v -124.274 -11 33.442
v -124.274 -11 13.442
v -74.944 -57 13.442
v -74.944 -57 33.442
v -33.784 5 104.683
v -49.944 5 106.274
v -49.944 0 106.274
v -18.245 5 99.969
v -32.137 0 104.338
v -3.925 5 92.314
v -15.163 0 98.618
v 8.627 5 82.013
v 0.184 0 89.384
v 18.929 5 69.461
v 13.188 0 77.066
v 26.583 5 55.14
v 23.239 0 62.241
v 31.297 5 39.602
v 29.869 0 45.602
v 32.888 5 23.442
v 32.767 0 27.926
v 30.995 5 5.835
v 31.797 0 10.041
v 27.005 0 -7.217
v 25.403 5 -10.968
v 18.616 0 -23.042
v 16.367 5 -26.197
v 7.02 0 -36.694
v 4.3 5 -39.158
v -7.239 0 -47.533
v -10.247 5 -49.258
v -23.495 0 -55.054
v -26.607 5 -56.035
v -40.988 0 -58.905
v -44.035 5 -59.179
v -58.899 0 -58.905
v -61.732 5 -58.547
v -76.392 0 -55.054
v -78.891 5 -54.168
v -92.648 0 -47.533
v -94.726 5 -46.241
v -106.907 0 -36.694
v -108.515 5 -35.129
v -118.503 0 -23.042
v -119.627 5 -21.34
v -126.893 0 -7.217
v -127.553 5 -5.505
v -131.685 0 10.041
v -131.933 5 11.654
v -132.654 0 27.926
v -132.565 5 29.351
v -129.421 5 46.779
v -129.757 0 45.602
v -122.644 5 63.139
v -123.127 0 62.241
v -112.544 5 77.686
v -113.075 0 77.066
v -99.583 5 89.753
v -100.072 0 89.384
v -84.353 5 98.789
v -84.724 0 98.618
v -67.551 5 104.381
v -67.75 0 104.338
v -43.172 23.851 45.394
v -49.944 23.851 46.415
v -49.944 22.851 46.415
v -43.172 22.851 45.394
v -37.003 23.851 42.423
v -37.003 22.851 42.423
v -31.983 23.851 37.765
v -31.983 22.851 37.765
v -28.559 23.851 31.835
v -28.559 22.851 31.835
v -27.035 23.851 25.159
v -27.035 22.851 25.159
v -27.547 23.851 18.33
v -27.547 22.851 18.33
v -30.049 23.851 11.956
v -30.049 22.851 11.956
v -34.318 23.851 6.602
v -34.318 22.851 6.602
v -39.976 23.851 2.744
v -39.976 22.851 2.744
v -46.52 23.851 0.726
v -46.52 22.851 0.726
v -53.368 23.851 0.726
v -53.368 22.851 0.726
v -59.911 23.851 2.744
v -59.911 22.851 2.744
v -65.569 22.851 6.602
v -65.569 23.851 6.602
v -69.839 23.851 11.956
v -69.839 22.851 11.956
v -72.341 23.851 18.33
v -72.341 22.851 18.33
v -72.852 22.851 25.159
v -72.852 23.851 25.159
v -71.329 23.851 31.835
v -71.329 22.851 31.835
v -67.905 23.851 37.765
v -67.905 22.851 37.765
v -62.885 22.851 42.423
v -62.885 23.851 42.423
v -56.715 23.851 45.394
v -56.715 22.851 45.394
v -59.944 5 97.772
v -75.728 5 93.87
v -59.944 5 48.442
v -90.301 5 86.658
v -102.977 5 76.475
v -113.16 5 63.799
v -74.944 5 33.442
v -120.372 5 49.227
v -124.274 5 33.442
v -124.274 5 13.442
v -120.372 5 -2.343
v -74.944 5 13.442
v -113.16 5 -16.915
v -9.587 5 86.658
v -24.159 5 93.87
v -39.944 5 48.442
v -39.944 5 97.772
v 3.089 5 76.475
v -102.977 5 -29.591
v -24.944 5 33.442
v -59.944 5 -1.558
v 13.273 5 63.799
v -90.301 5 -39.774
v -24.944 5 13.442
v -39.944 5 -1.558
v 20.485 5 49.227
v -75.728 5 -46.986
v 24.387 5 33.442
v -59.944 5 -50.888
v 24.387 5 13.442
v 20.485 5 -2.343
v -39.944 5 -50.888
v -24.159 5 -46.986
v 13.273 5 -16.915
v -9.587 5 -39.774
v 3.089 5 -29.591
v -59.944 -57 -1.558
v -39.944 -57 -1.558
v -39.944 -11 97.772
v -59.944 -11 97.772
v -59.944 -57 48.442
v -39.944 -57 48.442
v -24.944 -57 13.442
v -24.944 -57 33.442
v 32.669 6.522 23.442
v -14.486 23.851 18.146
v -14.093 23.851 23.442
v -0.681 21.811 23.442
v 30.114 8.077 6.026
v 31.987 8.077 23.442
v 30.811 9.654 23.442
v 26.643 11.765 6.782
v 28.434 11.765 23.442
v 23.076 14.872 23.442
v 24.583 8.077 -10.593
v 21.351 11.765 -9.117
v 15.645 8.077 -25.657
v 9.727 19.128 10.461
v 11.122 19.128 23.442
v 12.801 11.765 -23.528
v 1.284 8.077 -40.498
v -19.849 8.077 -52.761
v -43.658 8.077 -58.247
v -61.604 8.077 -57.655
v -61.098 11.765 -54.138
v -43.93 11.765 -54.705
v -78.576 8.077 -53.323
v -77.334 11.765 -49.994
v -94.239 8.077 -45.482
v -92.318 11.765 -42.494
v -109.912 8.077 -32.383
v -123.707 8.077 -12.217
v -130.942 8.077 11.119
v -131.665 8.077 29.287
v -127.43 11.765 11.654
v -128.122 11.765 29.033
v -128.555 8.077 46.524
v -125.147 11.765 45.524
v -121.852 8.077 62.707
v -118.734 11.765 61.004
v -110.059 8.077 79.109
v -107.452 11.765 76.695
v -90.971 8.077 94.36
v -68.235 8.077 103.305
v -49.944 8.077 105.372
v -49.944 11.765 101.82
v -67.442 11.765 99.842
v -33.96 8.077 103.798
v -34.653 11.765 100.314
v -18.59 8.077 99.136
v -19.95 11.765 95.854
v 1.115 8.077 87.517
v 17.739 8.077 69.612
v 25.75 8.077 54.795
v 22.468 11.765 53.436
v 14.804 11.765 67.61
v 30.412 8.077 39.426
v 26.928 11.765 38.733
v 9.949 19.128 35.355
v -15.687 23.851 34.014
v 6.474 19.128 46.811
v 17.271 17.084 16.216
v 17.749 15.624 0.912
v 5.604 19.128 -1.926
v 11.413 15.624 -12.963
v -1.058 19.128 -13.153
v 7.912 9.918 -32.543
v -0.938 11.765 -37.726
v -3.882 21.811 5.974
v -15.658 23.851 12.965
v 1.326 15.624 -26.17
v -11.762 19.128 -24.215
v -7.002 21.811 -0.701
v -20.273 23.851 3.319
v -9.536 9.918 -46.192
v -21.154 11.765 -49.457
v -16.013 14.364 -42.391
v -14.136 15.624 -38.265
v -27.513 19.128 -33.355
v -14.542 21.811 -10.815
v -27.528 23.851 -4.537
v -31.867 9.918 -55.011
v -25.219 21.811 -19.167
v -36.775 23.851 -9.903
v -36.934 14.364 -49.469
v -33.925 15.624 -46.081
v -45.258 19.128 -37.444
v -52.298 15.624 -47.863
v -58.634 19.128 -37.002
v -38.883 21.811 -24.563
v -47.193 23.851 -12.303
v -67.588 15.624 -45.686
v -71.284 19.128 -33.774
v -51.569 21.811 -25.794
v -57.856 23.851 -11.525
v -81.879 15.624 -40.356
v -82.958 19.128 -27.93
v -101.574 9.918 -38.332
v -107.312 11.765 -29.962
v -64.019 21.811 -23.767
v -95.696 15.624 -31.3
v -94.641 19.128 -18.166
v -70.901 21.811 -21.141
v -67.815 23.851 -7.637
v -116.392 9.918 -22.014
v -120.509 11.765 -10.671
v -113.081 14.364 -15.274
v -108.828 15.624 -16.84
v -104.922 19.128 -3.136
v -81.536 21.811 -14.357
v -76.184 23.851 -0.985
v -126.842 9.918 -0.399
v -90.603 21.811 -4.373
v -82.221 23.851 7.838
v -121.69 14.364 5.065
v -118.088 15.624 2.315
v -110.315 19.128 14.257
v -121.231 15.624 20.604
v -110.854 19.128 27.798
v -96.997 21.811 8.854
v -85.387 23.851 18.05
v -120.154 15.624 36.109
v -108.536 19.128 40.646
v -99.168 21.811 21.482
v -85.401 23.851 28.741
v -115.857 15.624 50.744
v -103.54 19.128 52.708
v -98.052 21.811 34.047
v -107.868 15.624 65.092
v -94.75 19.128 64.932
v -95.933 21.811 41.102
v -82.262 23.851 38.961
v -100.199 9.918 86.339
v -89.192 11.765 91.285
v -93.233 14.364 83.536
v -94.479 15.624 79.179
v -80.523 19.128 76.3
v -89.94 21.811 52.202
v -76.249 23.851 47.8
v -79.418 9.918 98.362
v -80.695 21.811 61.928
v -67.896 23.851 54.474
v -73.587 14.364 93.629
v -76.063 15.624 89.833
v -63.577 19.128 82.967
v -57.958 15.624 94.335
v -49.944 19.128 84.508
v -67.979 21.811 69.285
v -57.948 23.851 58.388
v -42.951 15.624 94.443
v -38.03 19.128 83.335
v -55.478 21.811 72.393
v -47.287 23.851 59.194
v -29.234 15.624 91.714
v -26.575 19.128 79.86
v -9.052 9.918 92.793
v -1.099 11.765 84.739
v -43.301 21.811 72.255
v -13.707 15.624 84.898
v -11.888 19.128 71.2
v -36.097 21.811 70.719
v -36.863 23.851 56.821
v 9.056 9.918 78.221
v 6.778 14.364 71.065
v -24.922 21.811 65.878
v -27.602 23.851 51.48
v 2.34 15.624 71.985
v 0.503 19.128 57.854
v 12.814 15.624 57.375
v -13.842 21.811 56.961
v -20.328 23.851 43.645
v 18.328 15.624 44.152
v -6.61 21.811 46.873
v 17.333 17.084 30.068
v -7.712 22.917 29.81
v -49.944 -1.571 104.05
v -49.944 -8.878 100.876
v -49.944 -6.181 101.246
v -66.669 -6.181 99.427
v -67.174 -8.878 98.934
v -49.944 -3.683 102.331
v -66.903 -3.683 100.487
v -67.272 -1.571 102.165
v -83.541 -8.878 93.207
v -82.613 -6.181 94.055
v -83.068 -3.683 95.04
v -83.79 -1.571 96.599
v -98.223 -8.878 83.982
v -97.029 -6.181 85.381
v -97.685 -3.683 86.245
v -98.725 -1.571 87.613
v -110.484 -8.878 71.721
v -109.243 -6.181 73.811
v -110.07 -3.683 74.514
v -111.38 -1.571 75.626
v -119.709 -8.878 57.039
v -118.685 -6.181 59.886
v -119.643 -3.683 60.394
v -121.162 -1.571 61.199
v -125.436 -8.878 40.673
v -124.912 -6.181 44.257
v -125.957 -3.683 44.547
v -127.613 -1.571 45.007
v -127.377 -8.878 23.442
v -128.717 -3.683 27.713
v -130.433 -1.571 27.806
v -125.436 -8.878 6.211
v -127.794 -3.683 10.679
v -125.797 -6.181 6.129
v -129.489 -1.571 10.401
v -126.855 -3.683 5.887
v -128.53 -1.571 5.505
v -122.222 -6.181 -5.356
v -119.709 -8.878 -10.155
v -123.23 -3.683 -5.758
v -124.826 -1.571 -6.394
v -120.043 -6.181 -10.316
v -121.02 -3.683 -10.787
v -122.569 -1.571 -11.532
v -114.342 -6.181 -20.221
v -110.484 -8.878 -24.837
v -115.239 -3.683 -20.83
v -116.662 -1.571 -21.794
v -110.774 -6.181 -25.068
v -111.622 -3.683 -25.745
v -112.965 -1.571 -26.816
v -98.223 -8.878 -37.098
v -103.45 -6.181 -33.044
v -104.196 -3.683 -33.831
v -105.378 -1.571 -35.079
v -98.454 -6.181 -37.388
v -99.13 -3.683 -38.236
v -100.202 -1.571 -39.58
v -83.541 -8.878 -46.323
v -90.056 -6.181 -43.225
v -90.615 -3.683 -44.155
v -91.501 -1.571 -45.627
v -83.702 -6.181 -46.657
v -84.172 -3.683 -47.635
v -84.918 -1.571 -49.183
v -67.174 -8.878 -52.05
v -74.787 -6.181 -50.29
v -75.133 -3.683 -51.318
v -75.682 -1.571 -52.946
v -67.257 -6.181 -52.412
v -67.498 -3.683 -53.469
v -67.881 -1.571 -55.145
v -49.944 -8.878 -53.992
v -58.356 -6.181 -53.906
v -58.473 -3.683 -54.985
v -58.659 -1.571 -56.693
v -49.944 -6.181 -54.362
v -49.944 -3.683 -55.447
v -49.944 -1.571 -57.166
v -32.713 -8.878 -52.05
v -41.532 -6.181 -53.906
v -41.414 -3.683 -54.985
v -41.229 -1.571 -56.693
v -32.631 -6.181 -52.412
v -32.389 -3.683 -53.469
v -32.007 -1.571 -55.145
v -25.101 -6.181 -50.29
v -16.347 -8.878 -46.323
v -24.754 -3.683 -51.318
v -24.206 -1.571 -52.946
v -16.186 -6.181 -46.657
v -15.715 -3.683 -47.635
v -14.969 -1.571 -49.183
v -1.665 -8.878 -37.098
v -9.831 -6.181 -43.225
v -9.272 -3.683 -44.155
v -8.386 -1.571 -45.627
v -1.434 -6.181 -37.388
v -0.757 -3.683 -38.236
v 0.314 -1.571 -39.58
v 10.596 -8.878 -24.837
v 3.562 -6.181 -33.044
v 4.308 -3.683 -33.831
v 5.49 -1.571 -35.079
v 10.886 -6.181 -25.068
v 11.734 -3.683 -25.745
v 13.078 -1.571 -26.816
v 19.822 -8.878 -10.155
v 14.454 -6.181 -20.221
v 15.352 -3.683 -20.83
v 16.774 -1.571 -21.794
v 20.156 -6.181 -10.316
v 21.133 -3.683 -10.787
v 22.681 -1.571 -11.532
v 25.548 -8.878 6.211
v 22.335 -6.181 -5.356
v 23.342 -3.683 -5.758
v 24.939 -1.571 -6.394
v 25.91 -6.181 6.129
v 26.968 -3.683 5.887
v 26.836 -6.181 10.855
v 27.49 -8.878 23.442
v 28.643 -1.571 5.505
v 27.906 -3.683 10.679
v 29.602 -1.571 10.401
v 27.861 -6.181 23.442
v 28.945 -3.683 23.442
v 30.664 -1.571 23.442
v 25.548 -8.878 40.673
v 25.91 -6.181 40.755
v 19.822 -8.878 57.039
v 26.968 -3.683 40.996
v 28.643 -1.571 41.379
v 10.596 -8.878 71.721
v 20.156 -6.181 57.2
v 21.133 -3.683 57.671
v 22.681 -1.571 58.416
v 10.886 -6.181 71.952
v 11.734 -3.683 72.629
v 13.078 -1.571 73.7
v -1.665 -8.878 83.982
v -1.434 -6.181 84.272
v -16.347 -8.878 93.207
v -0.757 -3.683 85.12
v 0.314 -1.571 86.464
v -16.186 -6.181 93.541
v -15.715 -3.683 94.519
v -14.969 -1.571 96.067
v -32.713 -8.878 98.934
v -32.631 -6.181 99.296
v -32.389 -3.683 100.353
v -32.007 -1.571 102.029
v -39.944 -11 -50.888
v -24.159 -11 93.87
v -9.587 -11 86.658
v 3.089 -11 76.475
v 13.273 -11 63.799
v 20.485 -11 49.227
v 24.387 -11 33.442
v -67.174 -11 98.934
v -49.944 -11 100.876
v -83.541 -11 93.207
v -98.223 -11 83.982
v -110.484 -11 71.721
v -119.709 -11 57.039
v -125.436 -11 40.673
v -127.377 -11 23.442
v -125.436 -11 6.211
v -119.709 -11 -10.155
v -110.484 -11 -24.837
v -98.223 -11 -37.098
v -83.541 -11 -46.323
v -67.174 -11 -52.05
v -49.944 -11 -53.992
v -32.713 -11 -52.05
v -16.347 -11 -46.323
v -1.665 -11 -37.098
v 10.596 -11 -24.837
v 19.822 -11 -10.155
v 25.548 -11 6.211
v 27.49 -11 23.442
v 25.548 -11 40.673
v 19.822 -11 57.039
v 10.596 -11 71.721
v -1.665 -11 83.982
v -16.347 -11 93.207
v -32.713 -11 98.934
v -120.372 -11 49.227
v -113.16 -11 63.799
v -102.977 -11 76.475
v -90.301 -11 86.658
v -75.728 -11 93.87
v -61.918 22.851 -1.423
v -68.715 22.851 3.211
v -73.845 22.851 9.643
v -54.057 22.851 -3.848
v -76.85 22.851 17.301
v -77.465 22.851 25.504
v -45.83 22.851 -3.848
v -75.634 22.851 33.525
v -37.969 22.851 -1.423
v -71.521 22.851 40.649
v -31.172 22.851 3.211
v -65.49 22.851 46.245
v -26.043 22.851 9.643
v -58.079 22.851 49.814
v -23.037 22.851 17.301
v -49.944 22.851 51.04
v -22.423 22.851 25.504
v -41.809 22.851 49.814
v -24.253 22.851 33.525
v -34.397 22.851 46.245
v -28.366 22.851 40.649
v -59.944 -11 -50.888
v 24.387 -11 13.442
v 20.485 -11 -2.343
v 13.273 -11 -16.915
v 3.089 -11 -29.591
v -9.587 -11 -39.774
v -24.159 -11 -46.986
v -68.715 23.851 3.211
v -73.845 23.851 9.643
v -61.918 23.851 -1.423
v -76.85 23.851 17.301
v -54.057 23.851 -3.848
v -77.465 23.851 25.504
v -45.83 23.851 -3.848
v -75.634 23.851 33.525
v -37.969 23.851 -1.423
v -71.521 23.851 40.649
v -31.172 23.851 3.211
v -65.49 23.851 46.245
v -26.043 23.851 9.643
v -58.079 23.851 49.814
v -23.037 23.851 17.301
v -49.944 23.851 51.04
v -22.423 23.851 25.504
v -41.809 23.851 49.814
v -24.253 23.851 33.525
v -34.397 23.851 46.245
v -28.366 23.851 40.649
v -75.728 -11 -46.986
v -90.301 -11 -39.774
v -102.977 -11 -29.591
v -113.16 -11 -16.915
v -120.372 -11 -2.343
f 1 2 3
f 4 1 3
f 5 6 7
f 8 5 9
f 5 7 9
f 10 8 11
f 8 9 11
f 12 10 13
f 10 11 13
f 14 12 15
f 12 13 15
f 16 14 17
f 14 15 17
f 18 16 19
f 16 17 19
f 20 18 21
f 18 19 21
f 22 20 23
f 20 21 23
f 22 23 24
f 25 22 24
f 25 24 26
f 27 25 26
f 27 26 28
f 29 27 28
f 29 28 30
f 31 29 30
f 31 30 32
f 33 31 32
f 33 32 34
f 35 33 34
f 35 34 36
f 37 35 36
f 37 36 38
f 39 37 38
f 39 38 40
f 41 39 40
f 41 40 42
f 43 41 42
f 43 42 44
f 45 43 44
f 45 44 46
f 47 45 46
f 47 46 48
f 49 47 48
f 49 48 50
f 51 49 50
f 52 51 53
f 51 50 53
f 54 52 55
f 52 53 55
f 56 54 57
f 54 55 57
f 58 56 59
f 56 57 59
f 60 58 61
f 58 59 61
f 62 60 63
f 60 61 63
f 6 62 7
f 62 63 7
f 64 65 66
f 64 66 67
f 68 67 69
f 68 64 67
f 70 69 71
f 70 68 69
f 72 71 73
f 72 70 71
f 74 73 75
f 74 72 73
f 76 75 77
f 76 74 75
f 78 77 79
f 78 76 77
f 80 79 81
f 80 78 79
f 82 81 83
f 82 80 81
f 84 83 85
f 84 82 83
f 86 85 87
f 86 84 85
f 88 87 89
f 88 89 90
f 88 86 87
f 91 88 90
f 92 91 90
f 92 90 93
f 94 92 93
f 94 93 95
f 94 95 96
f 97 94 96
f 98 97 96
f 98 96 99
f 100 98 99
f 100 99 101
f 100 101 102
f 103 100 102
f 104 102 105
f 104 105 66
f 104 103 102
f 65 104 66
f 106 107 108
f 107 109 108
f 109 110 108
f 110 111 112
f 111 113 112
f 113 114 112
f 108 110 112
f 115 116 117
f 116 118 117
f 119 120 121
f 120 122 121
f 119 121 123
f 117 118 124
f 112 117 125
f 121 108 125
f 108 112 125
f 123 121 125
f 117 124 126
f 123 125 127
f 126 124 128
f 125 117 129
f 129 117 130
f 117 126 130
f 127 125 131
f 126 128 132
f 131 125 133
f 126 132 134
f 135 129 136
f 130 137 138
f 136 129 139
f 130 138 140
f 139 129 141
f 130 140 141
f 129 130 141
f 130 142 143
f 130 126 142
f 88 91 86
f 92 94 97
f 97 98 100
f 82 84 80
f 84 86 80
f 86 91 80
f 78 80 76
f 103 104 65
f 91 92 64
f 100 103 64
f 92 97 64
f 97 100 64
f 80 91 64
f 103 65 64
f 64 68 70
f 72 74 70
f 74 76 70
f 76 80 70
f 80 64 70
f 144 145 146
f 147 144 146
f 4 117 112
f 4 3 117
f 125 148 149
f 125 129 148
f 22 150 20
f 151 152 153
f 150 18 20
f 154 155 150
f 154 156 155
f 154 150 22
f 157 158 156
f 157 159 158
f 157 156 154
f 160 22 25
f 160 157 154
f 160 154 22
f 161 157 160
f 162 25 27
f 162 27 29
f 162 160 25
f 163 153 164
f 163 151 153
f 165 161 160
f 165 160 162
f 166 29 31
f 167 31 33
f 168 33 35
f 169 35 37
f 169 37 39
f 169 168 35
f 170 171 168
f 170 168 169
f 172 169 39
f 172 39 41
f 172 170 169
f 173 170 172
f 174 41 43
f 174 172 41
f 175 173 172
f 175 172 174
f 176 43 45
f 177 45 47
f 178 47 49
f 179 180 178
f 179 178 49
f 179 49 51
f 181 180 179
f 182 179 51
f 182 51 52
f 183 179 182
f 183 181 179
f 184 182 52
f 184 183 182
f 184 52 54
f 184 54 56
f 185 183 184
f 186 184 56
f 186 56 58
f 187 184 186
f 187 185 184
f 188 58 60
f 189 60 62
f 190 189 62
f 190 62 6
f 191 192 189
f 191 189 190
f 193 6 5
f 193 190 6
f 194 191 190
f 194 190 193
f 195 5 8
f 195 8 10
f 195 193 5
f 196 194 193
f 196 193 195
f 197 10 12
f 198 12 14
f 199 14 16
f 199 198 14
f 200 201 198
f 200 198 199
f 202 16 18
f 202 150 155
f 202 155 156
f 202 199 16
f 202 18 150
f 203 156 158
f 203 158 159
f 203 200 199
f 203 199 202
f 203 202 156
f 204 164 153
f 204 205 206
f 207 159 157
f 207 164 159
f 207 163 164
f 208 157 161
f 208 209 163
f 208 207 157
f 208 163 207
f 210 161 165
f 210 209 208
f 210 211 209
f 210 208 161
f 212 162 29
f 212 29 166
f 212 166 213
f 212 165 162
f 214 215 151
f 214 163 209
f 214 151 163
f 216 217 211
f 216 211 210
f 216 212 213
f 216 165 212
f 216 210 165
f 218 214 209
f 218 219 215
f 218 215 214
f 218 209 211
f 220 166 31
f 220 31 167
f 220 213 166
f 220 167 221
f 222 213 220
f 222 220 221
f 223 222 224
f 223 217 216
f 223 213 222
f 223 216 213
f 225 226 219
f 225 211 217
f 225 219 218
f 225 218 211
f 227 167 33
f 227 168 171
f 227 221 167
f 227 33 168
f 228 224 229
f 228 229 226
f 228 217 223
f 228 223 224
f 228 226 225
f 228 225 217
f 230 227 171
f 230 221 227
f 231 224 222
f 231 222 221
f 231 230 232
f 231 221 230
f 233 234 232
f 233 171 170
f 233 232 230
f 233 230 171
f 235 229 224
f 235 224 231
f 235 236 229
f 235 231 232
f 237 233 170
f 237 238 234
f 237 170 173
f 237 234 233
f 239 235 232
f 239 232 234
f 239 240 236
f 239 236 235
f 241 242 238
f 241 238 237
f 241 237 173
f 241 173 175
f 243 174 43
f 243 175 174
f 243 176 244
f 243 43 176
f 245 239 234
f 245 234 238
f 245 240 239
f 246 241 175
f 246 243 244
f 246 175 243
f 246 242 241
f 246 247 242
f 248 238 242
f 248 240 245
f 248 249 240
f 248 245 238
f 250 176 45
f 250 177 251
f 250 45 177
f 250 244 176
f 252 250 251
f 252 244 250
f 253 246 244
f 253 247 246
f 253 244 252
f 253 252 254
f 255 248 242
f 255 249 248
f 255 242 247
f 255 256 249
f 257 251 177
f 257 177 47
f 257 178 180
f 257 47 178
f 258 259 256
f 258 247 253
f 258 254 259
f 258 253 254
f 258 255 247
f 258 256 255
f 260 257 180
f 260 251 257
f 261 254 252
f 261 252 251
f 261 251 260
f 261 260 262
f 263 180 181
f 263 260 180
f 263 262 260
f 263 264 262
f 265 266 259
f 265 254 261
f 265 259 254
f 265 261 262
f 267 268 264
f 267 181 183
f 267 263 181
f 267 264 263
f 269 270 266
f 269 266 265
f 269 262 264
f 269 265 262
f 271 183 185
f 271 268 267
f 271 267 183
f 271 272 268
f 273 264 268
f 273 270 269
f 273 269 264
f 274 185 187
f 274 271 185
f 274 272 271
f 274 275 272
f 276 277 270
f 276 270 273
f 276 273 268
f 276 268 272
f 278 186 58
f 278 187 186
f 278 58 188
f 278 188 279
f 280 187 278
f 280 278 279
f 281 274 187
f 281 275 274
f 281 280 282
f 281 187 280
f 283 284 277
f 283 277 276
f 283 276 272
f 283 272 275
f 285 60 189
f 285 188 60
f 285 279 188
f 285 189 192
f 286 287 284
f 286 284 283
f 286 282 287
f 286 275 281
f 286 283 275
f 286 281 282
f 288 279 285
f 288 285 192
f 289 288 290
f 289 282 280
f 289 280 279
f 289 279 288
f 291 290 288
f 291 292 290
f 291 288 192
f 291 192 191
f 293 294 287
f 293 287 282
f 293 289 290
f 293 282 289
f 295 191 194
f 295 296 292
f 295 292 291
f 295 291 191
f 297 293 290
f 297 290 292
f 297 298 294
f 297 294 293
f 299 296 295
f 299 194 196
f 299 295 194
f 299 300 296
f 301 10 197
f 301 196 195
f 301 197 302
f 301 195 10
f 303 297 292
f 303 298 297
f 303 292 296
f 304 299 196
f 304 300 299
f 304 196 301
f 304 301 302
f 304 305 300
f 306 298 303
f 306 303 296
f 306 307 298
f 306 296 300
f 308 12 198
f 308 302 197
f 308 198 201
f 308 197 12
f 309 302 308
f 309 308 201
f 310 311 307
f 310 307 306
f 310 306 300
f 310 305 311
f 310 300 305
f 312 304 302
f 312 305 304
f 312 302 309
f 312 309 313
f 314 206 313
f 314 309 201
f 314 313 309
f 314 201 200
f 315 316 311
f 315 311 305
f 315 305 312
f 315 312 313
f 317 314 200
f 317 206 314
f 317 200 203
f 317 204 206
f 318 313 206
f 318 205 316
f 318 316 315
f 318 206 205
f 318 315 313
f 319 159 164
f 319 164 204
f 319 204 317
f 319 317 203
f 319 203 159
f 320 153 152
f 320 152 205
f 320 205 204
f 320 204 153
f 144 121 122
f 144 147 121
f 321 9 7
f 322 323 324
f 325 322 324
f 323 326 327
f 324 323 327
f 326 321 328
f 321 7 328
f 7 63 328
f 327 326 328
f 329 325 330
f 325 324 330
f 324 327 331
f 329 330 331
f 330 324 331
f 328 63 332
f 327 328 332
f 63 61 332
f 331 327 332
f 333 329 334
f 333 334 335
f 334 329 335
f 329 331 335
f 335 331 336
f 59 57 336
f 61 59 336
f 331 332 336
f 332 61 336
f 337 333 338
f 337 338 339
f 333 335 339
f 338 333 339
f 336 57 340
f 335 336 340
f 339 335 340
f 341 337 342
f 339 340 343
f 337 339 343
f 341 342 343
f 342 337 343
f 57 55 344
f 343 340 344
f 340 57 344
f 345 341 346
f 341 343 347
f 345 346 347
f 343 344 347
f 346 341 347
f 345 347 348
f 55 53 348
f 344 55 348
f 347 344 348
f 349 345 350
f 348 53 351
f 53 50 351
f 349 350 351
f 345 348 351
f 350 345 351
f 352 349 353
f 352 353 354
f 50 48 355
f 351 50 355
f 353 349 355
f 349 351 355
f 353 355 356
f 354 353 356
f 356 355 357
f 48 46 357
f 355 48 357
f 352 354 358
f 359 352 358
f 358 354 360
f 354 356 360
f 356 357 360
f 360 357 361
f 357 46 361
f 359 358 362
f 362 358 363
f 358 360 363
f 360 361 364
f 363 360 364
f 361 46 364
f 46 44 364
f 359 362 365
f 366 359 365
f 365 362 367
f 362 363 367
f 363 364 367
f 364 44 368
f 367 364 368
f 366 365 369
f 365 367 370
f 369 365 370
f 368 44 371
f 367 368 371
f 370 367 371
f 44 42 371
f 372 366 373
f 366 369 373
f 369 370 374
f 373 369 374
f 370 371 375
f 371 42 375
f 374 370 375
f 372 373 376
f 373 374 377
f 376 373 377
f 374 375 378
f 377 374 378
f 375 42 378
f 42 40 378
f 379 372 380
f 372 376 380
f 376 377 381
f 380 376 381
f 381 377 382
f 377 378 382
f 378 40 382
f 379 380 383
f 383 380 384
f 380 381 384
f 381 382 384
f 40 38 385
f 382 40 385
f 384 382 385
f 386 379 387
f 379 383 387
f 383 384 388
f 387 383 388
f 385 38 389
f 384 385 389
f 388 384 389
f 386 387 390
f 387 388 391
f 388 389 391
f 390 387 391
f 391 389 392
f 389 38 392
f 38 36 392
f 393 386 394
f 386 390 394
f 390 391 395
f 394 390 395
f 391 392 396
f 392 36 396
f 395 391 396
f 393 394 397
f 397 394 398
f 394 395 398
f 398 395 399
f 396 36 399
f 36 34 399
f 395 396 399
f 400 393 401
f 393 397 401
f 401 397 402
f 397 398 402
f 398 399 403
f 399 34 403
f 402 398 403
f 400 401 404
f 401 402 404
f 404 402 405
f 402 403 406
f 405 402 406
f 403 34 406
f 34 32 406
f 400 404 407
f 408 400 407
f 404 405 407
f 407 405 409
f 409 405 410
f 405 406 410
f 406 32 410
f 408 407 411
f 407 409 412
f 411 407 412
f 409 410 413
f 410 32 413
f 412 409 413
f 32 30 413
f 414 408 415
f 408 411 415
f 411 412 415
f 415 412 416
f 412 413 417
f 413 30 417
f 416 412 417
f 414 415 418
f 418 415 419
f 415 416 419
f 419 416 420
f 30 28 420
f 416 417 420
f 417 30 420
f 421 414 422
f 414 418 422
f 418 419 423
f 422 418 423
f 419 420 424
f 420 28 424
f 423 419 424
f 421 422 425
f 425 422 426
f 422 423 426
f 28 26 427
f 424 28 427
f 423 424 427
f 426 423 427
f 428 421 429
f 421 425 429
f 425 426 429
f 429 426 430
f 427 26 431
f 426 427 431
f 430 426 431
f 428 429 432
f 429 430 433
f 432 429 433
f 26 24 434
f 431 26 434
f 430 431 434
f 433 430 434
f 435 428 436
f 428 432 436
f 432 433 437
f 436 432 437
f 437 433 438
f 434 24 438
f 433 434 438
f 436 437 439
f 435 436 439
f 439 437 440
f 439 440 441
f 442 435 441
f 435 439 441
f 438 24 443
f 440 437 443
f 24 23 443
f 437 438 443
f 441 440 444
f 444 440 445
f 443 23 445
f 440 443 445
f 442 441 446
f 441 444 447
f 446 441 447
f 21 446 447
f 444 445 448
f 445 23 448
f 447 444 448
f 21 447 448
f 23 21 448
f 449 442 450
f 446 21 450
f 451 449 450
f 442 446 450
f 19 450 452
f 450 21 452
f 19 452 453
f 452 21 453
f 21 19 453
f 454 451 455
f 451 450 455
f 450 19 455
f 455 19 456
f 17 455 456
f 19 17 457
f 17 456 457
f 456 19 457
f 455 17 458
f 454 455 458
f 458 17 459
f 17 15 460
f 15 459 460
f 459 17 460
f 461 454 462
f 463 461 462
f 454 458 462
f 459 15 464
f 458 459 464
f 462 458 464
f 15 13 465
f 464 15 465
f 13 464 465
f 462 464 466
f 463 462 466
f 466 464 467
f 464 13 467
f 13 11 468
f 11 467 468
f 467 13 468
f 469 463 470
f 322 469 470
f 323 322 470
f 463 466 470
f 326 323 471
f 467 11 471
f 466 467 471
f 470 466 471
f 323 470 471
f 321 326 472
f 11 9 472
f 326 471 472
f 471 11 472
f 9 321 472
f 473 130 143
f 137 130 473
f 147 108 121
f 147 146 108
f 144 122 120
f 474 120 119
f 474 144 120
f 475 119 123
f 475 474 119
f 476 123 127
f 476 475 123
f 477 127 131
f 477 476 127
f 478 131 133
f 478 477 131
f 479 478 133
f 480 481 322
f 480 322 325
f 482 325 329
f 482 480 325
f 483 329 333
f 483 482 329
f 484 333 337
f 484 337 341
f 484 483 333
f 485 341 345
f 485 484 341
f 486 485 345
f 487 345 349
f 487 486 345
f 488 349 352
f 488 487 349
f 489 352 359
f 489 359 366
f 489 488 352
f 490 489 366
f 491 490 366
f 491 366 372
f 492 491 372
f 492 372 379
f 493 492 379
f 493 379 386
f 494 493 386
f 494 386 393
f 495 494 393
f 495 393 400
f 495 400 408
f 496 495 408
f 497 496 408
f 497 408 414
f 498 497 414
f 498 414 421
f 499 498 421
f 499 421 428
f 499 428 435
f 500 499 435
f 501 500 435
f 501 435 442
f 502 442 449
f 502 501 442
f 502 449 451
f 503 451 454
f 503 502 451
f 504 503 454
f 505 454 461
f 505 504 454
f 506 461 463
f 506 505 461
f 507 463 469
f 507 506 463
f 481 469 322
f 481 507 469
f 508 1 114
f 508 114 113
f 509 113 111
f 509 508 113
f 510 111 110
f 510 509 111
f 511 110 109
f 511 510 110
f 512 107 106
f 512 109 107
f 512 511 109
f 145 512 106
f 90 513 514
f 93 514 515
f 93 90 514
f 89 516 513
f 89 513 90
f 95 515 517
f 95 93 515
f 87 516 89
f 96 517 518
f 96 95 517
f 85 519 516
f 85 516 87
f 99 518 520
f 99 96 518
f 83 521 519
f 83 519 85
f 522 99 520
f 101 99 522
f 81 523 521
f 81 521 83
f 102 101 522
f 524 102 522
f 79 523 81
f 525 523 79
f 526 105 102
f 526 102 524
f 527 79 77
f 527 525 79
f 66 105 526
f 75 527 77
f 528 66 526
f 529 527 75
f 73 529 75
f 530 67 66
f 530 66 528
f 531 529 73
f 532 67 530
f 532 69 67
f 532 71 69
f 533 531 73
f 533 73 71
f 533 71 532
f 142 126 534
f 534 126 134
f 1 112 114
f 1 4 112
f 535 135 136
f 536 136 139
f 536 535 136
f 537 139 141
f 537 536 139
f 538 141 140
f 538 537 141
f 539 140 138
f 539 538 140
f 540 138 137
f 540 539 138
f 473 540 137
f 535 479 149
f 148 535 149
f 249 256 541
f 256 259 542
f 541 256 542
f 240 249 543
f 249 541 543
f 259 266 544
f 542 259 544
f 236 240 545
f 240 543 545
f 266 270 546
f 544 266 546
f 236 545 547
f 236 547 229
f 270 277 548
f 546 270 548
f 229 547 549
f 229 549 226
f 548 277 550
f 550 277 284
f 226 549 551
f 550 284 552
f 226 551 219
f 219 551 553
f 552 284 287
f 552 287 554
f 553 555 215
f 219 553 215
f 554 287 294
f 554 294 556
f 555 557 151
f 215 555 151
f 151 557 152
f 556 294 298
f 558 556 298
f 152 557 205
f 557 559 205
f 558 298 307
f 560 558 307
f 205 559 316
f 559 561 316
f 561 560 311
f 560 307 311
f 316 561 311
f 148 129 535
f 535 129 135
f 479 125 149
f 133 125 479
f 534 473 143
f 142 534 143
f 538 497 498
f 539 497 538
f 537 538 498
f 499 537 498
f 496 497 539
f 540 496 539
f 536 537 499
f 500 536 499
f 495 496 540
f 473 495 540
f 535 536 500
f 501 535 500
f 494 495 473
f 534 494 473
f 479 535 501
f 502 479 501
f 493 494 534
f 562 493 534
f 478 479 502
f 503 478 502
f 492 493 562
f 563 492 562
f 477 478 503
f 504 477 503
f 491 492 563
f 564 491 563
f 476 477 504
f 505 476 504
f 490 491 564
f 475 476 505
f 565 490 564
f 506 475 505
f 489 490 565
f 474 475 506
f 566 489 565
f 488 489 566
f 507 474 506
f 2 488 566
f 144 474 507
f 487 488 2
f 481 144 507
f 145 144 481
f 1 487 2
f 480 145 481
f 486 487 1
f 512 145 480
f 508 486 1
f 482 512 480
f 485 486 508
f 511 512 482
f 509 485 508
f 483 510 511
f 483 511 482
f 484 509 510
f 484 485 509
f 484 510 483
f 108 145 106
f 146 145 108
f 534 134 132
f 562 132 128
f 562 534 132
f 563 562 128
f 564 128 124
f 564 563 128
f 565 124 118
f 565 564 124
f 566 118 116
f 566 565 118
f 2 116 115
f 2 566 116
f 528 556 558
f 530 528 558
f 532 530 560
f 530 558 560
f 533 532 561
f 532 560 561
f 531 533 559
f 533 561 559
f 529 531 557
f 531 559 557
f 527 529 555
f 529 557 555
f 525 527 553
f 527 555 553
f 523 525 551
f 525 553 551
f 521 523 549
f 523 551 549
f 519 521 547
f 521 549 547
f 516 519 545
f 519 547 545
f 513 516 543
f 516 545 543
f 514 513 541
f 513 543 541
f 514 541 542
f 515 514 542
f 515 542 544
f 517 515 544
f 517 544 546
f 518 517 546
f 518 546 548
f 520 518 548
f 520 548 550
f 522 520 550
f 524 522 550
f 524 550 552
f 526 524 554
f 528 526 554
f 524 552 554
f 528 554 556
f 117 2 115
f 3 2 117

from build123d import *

# Parameters (mm, degrees)
SKETCH1_R           = 82.832169861
BOSS_EXTRUDE1_DEPTH = 5
SKETCH3_W           = 93.167206873
SKETCH3_H           = 4.120105984
CUT_EXTRUDE1_DEPTH  = 75
SKETCH4_R           = 27.598349682
SKETCH4_R_2         = 22.972927947
CUT_EXTRUDE2_DEPTH  = 1
BOSS_EXTRUDE2_START = 11
SKETCH5_R           = 77.433591729
BOSS_EXTRUDE2_DEPTH = 11
FILLET1_R           = 10
SKETCH6_W           = 49.330343736
SKETCH6_H           = 20
BOSS_EXTRUDE3_DEPTH = 46
CUT_EXTRUDE3_DEPTH  = 46
CIRPATTERN1_COUNT   = 4


with BuildPart() as part:
    # Sketch1 → Boss-Extrude1 (new body)
    with BuildSketch(Plane(origin=(0, 0, 0), x_dir=(1, 0, 0), z_dir=(0, 1, 0))):
        with Locations(Location((-49.943747887, -23.441982102, 0), (0, 0, 270))):
            Circle(SKETCH1_R)
        with BuildLine():
            Line((-59.943747887, 50.888361635), (-59.943747887, 1.558017898))
            Line((-59.943747887, 1.558017898), (-39.943747887, 1.558017898))
            Line((-39.943747887, 1.558017898), (-39.943747887, 50.888361635))
            ThreePointArc((-39.943747887, 50.888361635), (3.089260702, 29.591026487), (24.386595849, -13.441982102))
            Line((24.386595849, -13.441982102), (-24.943747887, -13.441982102))
            Line((-24.943747887, -13.441982102), (-24.943747887, -33.441982102))
            Line((-24.943747887, -33.441982102), (24.386595849, -33.441982102))
            ThreePointArc((24.386595849, -33.441982102), (3.089260702, -76.474990691), (-39.943747887, -97.772325838))
            Line((-39.943747887, -97.772325838), (-39.943747887, -48.441982102))
            Line((-39.943747887, -48.441982102), (-59.943747887, -48.441982102))
            Line((-59.943747887, -48.441982102), (-59.943747887, -97.772325838))
            ThreePointArc((-59.943747887, -97.772325838), (-102.976756476, -76.474990691), (-124.274091624, -33.441982102))
            Line((-124.274091624, -33.441982102), (-74.943747887, -33.441982102))
            Line((-74.943747887, -33.441982102), (-74.943747887, -13.441982102))
            Line((-74.943747887, -13.441982102), (-124.274091624, -13.441982102))
            ThreePointArc((-124.274091624, -13.441982102), (-102.976756476, 29.591026487), (-59.943747887, 50.888361635))
        make_face(mode=Mode.SUBTRACT)
    extrude(amount=BOSS_EXTRUDE1_DEPTH)

    # Sketch2 → Revolve1 (revolve)
    with BuildSketch(Plane.XY.offset(23.441982102)):
        with BuildLine():
            Line((-49.943747887, 5), (-49.943747887, 25.910941369))
            add(Edge.make_bspline(
                [(32.888421974, 5), (32.888421974, 25.910941369), (-49.943747887, 25.910941369)],
                knots=[0, 0, 0, 1.570796327, 1.570796327, 1.570796327], degree=2, weights=[1, 0.707106781, 1]))
            Line((32.888421974, 5), (-49.943747887, 5))
        make_face()
    revolve(axis=Axis((-49.943747887, 5, 23.441982102), (0, 1, 0)))

    # Sketch3 → Cut-Extrude1 (cut, symmetric)
    with BuildSketch(Plane.XY.offset(23.441982102)):
        with Locations((-49.943747888, 25.910941369)):
            Rectangle(SKETCH3_W, SKETCH3_H)
    extrude(amount=CUT_EXTRUDE1_DEPTH, both=True, mode=Mode.SUBTRACT)

    # Sketch4 → Cut-Extrude2 (cut)
    with BuildSketch(Plane(origin=(0, 23.850888377, 0), x_dir=(1, 0, 0), z_dir=(0, 1, 0))):
        with Locations(Location((-49.943747887, -23.441982102, 0), (0, 0, 270))):
            Circle(SKETCH4_R)
        with Locations(Location((-49.943747887, -23.441982102, 0), (0, 0, 270))):
            Circle(SKETCH4_R_2, mode=Mode.SUBTRACT)
    extrude(amount=-CUT_EXTRUDE2_DEPTH, mode=Mode.SUBTRACT)

    # Sketch5 → Boss-Extrude2 (add)
    with BuildSketch(Plane.XZ.offset(BOSS_EXTRUDE2_START)):
        with Locations(Location((-49.943747887, 23.441982102, 0), (0, 0, 90))):
            Circle(SKETCH5_R)
        with BuildLine():
            Line((-59.943747887, 97.772325838), (-59.943747887, 48.441982102))
            Line((-59.943747887, 48.441982102), (-39.943747887, 48.441982102))
            Line((-39.943747887, 48.441982102), (-39.943747887, 97.772325838))
            ThreePointArc((-39.943747887, 97.772325838), (3.089260702, 76.474990691), (24.386595849, 33.441982102))
            Line((24.386595849, 33.441982102), (-24.943747887, 33.441982102))
            Line((-24.943747887, 33.441982102), (-24.943747887, 13.441982102))
            Line((-24.943747887, 13.441982102), (24.386595849, 13.441982102))
            ThreePointArc((24.386595849, 13.441982102), (3.089260702, -29.591026487), (-39.943747887, -50.888361635))
            Line((-39.943747887, -50.888361635), (-39.943747887, -1.558017898))
            Line((-39.943747887, -1.558017898), (-59.943747887, -1.558017898))
            Line((-59.943747887, -1.558017898), (-59.943747887, -50.888361635))
            ThreePointArc((-59.943747887, -50.888361635), (-102.976756476, -29.591026487), (-124.274091624, 13.441982102))
            Line((-124.274091624, 13.441982102), (-74.943747887, 13.441982102))
            Line((-74.943747887, 13.441982102), (-74.943747887, 33.441982102))
            Line((-74.943747887, 33.441982102), (-124.274091624, 33.441982102))
            ThreePointArc((-124.274091624, 33.441982102), (-102.976756476, 76.474990691), (-59.943747887, 97.772325838))
        make_face(mode=Mode.SUBTRACT)
    extrude(amount=-BOSS_EXTRUDE2_DEPTH)

    # Fillet1
    # the kernel refuses this fillet: 10 mm, written as the material it adds along each edge
    with BuildSketch(Plane(origin=(-49.943747887, 0, 23.441982102), x_dir=(0, 0, 1), z_dir=(1, 0, 0))) as fillet1_piece_1:
        with BuildLine():
            CenterArc((87.433591729, 8.878452387), FILLET1_R, 180, 62.603717063)
            Line((77.433591729, 8.878452387), (77.233591729, 8.878452387))
            Line((77.233591729, 8.878452387), (77.233591729, 0))
            Line((77.233591729, 0), (77.433591729, -0.2))
            ThreePointArc((77.433591729, -0.2), (80.132880795, -0.2), (82.740141424, -0.177569048))
            Line((82.740141424, -0.177569048), (82.832169861, 0))
        make_face()
    revolve(axis=Axis((-49.943747887, 0, 23.441982102), (0, -1, 0)))

    # Sketch6 → Boss-Extrude3 (add)
    with BuildSketch(Plane.XZ.offset(11)):
        with Locations((-0.278576019, 23.441982102)):
            Rectangle(SKETCH6_W, SKETCH6_H)
    boss_extrude3 = extrude(amount=BOSS_EXTRUDE3_DEPTH)

    # Sketch7 → Cut-Extrude3 (cut)
    with BuildSketch(Plane.XY.offset(33.441982102)):
        Polygon((24.386595849, -11), (-24.943747887, -57), (24.386595849, -57), align=None)
    cut_extrude3 = extrude(amount=-CUT_EXTRUDE3_DEPTH, mode=Mode.SUBTRACT)

    # CirPattern1: Boss-Extrude3, Cut-Extrude3 ×4 about axis
    cirpattern1_axis = Axis((-49.943747887, 0, 23.441982102), (0, 1, 0))
    add([boss_extrude3.rotate(cirpattern1_axis, i * 360 / CIRPATTERN1_COUNT) for i in range(1, CIRPATTERN1_COUNT)])
    add([cut_extrude3.rotate(cirpattern1_axis, i * 360 / CIRPATTERN1_COUNT) for i in range(1, CIRPATTERN1_COUNT)], mode=Mode.SUBTRACT)


solid = part.part
